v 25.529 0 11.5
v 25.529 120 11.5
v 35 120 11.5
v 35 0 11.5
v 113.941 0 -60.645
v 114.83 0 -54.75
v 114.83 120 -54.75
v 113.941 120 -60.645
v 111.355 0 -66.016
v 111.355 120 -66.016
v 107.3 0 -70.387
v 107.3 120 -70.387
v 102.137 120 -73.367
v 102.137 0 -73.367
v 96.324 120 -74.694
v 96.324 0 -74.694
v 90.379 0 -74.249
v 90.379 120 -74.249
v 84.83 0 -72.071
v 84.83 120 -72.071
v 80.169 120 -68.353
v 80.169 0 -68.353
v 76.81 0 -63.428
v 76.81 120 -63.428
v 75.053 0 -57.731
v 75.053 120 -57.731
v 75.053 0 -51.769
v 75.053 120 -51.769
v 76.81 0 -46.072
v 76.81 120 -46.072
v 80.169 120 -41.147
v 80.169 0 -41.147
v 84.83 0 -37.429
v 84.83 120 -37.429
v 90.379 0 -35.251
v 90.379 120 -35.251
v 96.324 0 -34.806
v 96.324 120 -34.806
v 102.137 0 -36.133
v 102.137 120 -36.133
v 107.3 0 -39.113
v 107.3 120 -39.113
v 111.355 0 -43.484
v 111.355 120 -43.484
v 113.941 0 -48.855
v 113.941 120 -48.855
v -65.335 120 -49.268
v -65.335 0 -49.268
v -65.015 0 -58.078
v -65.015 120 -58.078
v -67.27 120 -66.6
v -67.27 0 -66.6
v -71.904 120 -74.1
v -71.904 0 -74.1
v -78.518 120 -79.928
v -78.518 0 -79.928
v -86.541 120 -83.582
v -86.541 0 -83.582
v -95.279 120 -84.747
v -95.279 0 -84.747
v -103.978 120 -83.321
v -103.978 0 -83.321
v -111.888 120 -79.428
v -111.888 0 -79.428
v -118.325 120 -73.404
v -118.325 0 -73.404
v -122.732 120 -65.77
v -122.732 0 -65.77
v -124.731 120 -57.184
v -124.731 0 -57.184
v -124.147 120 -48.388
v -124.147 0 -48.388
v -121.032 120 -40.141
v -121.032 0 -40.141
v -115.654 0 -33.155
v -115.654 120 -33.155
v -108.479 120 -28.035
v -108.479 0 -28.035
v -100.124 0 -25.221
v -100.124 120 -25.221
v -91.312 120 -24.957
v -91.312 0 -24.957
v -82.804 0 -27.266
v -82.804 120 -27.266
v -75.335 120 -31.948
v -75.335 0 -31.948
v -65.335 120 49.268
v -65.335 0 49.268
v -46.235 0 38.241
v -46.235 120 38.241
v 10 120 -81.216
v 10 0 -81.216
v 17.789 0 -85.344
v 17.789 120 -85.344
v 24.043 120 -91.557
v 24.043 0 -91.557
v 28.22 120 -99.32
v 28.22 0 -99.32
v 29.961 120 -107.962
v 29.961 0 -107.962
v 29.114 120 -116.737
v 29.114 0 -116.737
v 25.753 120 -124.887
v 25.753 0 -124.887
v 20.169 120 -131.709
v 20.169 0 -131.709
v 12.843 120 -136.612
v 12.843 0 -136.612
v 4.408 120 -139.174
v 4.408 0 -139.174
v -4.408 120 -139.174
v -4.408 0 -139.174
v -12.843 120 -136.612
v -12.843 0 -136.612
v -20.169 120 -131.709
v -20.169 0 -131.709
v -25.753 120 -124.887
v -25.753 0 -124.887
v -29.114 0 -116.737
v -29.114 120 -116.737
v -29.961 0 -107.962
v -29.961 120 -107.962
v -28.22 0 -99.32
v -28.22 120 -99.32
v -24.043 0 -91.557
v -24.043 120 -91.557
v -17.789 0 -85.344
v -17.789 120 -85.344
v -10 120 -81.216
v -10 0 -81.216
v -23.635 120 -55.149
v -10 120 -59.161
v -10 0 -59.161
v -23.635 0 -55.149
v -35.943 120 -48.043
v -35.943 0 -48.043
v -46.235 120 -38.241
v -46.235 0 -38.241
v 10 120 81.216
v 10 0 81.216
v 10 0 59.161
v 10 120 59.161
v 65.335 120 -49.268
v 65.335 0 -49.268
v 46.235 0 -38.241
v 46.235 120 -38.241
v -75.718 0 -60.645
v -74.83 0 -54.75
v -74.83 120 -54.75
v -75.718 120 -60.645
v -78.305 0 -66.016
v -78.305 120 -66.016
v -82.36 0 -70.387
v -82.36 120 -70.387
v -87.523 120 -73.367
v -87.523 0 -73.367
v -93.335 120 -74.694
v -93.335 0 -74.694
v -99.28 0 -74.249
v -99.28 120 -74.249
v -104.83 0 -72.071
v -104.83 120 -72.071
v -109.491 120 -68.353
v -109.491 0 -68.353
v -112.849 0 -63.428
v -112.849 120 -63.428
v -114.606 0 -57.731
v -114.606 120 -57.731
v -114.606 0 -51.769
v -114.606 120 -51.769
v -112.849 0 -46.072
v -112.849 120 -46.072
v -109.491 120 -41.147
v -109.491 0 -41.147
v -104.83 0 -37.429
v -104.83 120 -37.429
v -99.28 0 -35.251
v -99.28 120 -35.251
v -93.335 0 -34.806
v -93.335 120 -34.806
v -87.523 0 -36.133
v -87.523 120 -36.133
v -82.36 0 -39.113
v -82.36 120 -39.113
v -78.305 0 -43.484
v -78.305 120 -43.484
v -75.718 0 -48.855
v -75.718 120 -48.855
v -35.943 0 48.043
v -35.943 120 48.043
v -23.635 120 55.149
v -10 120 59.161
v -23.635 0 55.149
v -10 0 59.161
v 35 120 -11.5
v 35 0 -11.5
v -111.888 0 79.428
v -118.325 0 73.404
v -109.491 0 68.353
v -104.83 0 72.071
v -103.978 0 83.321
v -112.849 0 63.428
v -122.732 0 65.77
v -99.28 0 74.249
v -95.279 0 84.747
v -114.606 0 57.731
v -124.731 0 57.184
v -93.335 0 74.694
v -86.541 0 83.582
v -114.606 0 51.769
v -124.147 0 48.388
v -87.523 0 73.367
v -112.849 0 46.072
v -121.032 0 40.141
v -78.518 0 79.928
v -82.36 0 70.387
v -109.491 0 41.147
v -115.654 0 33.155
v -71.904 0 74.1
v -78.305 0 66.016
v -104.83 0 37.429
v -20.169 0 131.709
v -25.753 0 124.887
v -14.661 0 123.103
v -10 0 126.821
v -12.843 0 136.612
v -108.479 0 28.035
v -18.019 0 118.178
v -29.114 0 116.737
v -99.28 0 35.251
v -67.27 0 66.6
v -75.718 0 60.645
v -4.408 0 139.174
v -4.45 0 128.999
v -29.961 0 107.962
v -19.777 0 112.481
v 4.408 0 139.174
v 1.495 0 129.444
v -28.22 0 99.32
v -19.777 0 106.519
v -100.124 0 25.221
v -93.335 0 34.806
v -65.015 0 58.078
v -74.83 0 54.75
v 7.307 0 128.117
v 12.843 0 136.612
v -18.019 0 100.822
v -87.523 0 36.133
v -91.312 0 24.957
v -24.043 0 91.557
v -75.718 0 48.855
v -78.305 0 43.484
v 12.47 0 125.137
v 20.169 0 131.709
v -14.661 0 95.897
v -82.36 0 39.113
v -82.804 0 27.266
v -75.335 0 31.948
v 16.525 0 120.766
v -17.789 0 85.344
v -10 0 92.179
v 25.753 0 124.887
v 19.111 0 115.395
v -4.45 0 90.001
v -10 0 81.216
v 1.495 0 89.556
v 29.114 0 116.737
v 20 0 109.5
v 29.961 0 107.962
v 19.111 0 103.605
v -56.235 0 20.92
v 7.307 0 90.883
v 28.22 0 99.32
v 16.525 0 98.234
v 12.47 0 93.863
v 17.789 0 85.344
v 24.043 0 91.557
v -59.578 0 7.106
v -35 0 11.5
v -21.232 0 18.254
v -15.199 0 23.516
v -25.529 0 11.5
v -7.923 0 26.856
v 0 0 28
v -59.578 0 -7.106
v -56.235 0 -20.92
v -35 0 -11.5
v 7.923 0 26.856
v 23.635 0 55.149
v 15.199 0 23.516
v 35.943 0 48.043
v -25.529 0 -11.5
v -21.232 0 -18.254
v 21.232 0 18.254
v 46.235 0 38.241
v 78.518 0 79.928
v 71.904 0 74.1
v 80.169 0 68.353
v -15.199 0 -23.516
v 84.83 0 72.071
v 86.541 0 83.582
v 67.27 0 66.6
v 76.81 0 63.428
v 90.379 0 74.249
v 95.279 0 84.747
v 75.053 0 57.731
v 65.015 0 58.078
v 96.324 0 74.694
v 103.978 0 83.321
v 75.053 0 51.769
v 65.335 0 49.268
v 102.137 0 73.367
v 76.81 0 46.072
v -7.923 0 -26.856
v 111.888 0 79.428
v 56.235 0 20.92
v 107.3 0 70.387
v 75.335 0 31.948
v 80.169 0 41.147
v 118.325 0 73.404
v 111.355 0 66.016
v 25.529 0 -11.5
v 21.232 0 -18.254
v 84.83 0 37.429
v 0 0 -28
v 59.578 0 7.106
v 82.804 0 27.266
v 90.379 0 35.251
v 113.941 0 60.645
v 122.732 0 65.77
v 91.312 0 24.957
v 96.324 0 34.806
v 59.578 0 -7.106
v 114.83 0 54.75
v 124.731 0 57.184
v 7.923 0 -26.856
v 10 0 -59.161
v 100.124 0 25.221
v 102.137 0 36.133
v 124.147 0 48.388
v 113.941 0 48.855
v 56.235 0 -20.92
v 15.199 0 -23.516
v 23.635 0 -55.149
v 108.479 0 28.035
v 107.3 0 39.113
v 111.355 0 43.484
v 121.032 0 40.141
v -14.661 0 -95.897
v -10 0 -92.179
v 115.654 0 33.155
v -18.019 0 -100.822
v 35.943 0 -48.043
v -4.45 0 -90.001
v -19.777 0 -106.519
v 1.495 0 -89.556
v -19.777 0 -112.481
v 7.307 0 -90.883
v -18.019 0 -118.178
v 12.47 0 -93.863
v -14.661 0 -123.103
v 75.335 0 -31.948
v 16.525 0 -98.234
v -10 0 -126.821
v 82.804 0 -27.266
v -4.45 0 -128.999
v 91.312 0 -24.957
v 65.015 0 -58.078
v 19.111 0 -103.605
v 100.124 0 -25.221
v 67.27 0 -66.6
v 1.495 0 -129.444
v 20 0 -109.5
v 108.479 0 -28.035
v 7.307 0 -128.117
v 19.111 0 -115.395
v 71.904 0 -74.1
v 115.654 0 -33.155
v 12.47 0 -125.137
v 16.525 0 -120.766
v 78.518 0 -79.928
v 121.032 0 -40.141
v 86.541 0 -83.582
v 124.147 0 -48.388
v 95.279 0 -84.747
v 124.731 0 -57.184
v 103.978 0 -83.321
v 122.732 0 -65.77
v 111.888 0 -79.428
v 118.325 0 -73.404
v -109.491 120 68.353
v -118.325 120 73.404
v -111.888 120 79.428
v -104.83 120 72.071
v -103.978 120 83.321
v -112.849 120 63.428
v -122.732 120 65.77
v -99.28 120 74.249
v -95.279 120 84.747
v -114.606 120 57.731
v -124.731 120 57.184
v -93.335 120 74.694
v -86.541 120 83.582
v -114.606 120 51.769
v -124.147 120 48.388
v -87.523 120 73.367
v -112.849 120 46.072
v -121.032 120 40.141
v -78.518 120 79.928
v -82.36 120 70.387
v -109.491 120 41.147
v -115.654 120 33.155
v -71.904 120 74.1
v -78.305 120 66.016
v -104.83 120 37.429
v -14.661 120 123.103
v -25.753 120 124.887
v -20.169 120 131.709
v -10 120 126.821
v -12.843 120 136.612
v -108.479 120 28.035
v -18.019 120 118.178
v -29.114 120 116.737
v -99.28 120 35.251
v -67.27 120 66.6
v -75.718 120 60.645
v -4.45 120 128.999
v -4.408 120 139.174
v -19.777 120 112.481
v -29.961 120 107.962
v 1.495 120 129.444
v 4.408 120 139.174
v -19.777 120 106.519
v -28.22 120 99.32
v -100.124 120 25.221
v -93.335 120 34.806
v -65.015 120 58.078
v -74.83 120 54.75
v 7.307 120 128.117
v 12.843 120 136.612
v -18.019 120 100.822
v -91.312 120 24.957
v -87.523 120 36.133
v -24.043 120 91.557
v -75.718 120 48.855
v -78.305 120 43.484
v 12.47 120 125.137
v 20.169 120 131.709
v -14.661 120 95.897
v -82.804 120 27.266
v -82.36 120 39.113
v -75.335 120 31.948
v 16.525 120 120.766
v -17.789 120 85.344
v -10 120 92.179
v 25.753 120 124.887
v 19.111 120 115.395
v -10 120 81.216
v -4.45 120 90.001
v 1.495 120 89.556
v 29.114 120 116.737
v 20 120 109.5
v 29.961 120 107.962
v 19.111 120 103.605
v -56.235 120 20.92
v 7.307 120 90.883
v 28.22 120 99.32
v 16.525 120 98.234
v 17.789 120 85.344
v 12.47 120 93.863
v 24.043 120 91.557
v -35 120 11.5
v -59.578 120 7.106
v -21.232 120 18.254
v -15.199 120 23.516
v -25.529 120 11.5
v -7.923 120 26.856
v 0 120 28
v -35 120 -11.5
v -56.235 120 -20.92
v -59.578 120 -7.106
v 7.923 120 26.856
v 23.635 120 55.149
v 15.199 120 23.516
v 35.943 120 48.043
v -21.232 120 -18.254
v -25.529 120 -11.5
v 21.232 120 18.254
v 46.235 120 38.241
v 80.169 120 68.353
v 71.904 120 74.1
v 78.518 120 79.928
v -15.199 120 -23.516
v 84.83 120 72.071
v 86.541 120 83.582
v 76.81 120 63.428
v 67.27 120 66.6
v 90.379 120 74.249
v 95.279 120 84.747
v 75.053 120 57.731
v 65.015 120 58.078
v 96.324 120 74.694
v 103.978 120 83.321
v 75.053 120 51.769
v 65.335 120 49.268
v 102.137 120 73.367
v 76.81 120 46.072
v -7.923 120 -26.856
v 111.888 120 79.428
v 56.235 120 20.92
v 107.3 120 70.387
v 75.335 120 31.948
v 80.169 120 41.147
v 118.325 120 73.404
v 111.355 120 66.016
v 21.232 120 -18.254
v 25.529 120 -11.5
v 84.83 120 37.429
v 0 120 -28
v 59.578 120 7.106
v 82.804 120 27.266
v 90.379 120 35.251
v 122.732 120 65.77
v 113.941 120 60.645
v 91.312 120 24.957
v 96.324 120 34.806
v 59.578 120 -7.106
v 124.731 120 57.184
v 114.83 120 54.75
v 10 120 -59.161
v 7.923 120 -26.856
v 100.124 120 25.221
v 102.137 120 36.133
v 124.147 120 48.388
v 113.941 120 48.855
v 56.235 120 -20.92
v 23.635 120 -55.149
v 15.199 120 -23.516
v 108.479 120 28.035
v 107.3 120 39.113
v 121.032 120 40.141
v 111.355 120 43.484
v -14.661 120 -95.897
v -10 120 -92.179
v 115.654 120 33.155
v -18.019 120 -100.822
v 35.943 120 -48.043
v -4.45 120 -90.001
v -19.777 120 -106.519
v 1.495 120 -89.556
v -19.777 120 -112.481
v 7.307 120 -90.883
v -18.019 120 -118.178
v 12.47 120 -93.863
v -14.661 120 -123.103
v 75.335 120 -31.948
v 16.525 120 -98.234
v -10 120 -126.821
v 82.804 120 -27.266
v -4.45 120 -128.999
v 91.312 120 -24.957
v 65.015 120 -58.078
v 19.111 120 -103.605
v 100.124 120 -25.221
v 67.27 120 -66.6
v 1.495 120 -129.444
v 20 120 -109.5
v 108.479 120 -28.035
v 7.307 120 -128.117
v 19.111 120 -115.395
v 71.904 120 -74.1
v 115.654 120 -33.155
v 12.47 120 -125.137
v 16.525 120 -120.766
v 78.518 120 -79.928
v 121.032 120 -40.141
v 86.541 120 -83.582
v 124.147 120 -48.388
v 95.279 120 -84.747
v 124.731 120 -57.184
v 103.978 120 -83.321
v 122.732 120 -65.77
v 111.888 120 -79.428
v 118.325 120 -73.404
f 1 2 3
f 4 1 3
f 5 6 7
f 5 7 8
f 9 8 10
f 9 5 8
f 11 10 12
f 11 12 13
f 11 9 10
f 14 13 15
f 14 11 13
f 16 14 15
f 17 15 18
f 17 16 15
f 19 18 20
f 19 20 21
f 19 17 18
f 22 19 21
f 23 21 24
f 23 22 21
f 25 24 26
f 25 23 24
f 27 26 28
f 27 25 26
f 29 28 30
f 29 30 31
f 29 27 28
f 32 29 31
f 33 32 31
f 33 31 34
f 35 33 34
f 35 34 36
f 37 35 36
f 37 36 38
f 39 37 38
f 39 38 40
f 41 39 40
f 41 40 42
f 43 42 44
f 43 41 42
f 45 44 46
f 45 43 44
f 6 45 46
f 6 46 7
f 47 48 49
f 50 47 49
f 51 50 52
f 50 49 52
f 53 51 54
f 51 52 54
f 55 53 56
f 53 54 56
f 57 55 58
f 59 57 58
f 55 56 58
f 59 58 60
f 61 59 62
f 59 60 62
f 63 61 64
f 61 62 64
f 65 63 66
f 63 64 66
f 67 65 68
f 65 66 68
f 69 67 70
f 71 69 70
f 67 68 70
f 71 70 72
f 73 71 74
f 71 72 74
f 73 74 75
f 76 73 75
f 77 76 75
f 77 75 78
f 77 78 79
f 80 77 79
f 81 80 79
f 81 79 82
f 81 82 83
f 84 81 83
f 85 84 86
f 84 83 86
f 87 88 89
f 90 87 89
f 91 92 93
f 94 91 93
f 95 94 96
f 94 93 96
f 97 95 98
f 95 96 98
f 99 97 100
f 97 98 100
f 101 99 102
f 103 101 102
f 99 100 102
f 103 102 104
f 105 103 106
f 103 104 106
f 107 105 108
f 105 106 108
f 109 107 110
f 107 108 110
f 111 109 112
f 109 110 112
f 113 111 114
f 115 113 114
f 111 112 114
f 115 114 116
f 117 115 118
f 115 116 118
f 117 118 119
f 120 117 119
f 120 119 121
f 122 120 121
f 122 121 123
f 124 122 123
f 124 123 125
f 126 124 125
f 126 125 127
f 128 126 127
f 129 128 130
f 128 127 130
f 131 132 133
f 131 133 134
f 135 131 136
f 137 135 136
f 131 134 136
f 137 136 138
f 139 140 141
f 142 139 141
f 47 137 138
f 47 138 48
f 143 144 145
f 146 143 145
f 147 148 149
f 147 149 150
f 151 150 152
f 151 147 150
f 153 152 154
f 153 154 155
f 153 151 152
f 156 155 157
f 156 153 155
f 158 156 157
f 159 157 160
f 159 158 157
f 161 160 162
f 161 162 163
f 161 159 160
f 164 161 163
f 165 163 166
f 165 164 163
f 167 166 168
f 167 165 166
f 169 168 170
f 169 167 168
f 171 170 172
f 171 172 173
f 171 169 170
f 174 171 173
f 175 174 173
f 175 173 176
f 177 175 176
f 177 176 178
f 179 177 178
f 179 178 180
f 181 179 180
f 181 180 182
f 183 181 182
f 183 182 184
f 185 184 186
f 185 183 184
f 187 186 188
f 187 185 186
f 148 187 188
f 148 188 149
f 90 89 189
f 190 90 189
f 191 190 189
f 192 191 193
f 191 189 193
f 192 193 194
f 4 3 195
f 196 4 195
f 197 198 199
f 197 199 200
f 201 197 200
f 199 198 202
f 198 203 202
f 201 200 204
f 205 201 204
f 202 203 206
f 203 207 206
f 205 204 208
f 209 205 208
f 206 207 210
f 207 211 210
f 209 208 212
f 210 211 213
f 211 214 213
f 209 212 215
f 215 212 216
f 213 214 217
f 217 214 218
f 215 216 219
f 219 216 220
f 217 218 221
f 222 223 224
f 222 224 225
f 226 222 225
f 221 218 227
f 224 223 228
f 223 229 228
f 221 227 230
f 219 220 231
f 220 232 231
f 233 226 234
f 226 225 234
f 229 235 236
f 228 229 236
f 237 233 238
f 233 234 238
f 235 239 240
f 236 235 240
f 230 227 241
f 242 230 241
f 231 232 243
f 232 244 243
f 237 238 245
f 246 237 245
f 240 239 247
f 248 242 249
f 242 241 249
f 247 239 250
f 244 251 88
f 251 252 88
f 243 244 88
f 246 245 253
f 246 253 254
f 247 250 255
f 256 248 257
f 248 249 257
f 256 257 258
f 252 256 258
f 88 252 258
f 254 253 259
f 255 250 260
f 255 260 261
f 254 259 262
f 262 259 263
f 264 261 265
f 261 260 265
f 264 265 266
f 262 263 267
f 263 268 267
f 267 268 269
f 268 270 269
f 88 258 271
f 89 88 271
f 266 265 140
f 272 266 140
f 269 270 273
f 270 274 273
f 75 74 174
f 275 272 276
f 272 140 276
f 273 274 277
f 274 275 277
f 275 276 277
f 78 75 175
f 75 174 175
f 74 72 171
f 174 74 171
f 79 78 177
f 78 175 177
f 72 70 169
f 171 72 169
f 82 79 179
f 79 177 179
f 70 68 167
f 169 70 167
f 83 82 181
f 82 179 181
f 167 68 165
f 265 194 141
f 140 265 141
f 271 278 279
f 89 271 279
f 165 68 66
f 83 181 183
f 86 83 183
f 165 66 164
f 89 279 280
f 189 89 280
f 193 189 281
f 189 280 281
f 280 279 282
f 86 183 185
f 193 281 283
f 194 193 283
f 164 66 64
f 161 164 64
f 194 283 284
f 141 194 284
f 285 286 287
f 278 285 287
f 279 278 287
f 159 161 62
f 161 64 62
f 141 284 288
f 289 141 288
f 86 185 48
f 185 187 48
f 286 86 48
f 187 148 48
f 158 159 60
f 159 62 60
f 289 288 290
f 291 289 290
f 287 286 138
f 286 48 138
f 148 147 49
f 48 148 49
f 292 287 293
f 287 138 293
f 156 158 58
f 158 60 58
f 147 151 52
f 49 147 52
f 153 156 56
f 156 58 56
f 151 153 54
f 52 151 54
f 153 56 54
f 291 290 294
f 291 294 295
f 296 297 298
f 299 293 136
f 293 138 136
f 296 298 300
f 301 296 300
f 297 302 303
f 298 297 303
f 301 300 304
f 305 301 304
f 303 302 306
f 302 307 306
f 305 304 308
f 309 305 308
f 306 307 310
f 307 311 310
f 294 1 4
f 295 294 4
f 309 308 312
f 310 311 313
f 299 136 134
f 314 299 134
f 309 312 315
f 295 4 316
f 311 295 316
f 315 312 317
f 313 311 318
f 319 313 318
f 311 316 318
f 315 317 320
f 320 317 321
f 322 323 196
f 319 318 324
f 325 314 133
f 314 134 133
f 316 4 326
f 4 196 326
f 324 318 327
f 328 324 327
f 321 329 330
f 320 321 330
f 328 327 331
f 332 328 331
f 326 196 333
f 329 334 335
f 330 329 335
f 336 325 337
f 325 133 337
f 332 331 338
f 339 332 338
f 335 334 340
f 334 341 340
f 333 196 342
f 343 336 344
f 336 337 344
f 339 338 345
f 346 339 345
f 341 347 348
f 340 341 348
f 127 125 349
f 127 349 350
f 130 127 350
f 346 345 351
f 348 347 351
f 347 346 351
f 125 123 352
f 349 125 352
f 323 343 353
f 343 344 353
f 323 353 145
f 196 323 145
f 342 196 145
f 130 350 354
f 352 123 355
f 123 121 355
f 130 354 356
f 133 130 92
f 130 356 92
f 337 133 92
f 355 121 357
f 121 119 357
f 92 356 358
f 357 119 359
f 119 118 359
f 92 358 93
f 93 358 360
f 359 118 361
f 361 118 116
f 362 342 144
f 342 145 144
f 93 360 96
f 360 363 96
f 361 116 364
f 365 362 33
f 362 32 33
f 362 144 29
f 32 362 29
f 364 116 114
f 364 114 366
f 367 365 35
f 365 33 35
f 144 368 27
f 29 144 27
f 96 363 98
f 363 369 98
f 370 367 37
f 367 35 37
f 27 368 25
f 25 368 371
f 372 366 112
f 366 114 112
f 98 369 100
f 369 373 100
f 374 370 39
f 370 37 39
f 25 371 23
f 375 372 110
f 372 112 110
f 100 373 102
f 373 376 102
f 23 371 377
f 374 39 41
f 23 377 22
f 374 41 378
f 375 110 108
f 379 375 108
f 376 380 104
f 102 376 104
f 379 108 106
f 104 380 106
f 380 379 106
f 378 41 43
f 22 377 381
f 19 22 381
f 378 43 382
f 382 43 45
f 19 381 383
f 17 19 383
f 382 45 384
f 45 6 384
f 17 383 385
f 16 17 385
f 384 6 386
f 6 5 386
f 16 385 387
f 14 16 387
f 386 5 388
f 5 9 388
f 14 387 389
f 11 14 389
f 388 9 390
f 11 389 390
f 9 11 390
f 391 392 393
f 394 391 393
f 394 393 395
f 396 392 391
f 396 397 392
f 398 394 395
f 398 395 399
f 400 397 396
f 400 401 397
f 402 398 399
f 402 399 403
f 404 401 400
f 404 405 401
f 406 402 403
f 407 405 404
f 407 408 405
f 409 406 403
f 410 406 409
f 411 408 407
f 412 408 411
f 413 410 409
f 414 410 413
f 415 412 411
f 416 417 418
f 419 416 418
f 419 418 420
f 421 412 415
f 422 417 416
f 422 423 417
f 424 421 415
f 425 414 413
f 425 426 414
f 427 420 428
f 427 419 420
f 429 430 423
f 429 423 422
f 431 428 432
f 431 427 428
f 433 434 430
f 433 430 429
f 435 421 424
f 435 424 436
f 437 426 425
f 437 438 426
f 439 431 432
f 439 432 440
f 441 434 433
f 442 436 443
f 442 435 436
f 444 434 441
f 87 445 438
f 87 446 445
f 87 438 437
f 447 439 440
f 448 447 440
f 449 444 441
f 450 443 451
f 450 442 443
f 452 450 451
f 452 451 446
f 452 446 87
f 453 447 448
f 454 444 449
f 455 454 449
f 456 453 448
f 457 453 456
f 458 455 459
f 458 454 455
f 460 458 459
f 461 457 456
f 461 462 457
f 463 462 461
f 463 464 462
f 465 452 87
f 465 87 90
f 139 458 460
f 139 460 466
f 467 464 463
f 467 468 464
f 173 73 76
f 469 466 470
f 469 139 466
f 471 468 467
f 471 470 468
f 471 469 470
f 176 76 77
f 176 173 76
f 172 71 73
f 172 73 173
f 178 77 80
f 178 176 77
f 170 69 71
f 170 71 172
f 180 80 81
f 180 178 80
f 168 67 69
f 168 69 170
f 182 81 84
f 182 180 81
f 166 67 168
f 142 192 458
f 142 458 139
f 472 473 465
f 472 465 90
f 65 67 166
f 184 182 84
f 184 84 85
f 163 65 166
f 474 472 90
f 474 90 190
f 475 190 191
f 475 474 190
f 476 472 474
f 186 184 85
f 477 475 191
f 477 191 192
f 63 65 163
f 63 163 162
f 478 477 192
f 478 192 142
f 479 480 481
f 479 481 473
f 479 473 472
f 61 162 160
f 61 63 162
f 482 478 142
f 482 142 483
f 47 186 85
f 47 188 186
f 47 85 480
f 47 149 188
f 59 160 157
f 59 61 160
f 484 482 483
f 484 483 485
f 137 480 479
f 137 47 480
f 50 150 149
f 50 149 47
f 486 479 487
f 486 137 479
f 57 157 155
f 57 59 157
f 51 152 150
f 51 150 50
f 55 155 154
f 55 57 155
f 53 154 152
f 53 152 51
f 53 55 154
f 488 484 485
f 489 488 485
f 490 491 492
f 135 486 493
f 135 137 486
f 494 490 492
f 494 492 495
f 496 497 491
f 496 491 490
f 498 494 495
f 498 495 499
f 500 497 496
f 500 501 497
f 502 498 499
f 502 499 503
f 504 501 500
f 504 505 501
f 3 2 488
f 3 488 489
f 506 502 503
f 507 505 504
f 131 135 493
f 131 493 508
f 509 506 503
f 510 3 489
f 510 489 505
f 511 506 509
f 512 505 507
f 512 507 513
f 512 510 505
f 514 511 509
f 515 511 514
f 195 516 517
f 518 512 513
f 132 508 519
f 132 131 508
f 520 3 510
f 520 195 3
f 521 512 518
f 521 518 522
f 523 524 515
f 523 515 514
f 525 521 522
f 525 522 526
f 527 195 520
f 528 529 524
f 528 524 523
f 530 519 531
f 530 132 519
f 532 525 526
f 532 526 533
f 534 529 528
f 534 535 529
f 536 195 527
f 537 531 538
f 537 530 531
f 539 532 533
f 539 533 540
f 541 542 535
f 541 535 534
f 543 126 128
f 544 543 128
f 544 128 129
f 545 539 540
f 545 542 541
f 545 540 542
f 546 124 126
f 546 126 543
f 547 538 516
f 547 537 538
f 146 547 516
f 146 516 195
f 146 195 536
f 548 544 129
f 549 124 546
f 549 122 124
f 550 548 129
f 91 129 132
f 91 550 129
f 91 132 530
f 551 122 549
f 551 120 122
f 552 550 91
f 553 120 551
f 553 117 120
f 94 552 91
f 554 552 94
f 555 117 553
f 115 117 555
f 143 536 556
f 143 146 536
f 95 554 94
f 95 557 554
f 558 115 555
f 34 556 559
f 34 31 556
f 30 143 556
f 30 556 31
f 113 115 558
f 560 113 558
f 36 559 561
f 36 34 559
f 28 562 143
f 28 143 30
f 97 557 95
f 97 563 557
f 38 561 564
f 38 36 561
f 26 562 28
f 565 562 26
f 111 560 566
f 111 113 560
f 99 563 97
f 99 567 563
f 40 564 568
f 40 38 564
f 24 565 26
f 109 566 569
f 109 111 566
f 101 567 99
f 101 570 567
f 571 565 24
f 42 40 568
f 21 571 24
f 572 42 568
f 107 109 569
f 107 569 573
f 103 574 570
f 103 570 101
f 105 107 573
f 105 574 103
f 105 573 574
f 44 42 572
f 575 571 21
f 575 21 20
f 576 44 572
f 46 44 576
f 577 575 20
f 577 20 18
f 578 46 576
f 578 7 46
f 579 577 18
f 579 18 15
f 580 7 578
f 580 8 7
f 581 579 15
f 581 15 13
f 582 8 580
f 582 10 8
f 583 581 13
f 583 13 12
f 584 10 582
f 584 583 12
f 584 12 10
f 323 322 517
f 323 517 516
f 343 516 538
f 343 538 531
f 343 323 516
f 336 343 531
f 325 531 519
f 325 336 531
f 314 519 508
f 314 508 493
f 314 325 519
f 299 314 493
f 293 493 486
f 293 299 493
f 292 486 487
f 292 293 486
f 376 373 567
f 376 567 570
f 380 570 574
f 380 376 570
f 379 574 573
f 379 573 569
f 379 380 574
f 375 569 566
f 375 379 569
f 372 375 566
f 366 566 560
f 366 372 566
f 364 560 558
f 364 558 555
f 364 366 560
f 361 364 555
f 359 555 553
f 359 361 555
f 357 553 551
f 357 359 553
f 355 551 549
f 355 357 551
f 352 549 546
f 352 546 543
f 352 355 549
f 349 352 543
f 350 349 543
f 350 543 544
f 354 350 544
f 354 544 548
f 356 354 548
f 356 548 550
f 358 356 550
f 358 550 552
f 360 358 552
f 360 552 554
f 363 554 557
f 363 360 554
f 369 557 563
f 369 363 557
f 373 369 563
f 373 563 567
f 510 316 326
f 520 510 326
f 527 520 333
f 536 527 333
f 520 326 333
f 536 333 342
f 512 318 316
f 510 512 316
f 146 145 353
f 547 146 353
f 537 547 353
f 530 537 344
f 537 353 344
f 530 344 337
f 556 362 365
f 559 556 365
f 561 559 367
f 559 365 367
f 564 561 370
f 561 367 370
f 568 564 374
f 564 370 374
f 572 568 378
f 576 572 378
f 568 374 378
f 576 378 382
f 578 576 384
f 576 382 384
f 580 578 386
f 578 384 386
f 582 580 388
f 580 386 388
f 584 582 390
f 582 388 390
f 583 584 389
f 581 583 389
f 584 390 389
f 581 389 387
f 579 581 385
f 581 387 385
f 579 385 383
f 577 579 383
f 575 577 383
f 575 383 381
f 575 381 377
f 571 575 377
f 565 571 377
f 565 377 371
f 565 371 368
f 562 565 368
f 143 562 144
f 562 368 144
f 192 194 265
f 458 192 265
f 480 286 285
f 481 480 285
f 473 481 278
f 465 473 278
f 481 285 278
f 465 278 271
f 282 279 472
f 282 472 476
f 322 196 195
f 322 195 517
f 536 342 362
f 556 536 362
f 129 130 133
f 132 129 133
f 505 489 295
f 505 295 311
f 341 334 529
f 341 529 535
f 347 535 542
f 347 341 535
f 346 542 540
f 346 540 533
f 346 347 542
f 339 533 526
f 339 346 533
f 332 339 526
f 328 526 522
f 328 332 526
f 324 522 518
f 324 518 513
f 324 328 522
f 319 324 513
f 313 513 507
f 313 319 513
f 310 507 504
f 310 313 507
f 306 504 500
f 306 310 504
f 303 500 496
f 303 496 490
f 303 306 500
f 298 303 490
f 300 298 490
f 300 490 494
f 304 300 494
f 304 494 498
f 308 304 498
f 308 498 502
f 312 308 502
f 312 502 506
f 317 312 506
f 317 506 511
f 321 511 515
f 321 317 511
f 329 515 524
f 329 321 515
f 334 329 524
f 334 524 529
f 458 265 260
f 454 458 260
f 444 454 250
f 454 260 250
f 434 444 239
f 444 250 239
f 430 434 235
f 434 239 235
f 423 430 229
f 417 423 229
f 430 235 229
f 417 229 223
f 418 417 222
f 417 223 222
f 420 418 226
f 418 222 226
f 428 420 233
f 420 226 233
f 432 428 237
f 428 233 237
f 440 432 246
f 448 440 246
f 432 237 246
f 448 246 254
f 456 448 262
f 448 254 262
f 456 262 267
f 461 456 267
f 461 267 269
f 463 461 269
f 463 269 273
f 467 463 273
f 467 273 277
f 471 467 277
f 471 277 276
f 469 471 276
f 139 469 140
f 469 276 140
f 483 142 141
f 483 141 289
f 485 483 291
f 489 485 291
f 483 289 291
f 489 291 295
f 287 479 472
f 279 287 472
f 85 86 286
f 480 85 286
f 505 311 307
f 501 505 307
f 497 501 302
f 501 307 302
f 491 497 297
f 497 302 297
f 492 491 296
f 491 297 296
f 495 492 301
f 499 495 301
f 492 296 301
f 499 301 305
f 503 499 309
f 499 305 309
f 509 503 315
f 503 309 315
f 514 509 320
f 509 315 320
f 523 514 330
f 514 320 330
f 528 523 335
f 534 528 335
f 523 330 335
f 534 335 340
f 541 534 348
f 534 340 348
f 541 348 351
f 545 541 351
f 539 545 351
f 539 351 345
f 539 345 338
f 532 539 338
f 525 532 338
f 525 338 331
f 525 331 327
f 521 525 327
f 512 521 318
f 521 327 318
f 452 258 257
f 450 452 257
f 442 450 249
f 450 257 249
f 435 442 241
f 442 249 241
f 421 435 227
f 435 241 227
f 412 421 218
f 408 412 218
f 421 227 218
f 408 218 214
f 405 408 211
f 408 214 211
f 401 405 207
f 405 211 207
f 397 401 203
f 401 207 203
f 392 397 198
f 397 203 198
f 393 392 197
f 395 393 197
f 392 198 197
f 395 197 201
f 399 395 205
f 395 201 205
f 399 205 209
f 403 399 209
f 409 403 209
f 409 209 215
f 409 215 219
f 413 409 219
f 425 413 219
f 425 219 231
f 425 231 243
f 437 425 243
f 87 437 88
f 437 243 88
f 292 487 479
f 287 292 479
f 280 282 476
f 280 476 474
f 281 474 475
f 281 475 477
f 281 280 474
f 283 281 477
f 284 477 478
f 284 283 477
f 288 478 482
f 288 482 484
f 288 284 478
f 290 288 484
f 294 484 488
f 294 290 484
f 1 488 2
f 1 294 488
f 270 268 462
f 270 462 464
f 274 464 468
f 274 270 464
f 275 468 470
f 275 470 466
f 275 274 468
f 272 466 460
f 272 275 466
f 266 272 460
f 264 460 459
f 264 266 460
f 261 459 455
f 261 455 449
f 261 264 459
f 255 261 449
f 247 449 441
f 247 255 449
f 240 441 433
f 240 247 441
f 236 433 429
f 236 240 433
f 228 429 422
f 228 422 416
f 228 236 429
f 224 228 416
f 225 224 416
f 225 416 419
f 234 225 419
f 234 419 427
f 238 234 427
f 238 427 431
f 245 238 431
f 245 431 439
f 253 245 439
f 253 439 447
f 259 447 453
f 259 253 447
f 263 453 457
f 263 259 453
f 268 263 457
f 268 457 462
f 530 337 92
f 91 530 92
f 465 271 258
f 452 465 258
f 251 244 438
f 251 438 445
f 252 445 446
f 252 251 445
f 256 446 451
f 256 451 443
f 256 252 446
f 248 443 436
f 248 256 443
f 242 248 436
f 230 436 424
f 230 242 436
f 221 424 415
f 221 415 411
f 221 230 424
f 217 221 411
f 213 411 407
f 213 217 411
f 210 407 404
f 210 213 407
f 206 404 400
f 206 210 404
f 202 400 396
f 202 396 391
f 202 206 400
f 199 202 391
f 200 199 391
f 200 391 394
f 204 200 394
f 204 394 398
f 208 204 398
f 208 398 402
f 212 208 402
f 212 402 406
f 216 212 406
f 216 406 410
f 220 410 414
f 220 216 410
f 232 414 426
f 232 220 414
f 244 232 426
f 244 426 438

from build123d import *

# Parameters (mm, degrees)
SKETCH1_R           = 20
BOSS_EXTRUDE1_DEPTH = 120


with BuildPart() as part:
    # Sketch1 → Boss-Extrude1 (new body)
    with BuildSketch(Plane(origin=(0, 0, 0), x_dir=(1, 0, 0), z_dir=(0, 1, 0))):
        with BuildLine():
            Line((-10, 81.215728753), (-10, 59.160797831))
            ThreePointArc((-10, 59.160797831), (-30, 51.961524227), (-46.23475383, 38.240652953))
            Line((-46.23475383, 38.240652953), (-65.334884287, 49.268118414))
            ThreePointArc((-65.334884287, 49.268118414), (-120.810543828, 69.75), (-75.334884287, 31.947610338))
            Line((-75.334884287, 31.947610338), (-56.23475383, 20.920144878))
            ThreePointArc((-56.23475383, 20.920144878), (-60, 0), (-56.23475383, -20.920144878))
            Line((-56.23475383, -20.920144878), (-75.334884287, -31.947610338))
            ThreePointArc((-75.334884287, -31.947610338), (-120.810543828, -69.75), (-65.334884287, -49.268118414))
            Line((-65.334884287, -49.268118414), (-46.23475383, -38.240652953))
            ThreePointArc((-46.23475383, -38.240652953), (-30, -51.961524227), (-10, -59.160797831))
            Line((-10, -59.160797831), (-10, -81.215728753))
            ThreePointArc((-10, -81.215728753), (0, -139.5), (10, -81.215728753))
            Line((10, -81.215728753), (10, -59.160797831))
            ThreePointArc((10, -59.160797831), (30, -51.961524227), (46.23475383, -38.240652953))
            Line((46.23475383, -38.240652953), (65.334884287, -49.268118414))
            ThreePointArc((65.334884287, -49.268118414), (120.810543828, -69.75), (75.334884287, -31.947610338))
            Line((75.334884287, -31.947610338), (56.23475383, -20.920144878))
            ThreePointArc((56.23475383, -20.920144878), (60, 0), (56.23475383, 20.920144878))
            Line((56.23475383, 20.920144878), (75.334884287, 31.947610338))
            ThreePointArc((75.334884287, 31.947610338), (120.810543828, 69.75), (65.334884287, 49.268118414))
            Line((65.334884287, 49.268118414), (46.23475383, 38.240652953))
            ThreePointArc((46.23475383, 38.240652953), (30, 51.961524227), (10, 59.160797831))
            Line((10, 59.160797831), (10, 81.215728753))
            ThreePointArc((10, 81.215728753), (0, 139.5), (-10, 81.215728753))
        make_face()
        with Locations((0, 109.5)):
            Circle(SKETCH1_R, mode=Mode.SUBTRACT)
        with Locations((94.829781714, 54.75)):
            Circle(SKETCH1_R, mode=Mode.SUBTRACT)
        with Locations((94.829781714, -54.75)):
            Circle(SKETCH1_R, mode=Mode.SUBTRACT)
        with Locations((0, -109.5)):
            Circle(SKETCH1_R, mode=Mode.SUBTRACT)
        with Locations((-94.829781714, -54.75)):
            Circle(SKETCH1_R, mode=Mode.SUBTRACT)
        with Locations((-94.829781714, 54.75)):
            Circle(SKETCH1_R, mode=Mode.SUBTRACT)
        with BuildLine():
            Line((-35, 11.5), (-35, -11.5))
            Line((-35, -11.5), (-25.529394822, -11.5))
            ThreePointArc((-25.529394822, -11.5), (0, -28), (25.529394822, -11.5))
            Line((25.529394822, -11.5), (35, -11.5))
            Line((35, -11.5), (35, 11.5))
            Line((35, 11.5), (25.529394822, 11.5))
            ThreePointArc((25.529394822, 11.5), (0, 28), (-25.529394822, 11.5))
            Line((-25.529394822, 11.5), (-35, 11.5))
        make_face(mode=Mode.SUBTRACT)
    extrude(amount=BOSS_EXTRUDE1_DEPTH)


solid = part.part
